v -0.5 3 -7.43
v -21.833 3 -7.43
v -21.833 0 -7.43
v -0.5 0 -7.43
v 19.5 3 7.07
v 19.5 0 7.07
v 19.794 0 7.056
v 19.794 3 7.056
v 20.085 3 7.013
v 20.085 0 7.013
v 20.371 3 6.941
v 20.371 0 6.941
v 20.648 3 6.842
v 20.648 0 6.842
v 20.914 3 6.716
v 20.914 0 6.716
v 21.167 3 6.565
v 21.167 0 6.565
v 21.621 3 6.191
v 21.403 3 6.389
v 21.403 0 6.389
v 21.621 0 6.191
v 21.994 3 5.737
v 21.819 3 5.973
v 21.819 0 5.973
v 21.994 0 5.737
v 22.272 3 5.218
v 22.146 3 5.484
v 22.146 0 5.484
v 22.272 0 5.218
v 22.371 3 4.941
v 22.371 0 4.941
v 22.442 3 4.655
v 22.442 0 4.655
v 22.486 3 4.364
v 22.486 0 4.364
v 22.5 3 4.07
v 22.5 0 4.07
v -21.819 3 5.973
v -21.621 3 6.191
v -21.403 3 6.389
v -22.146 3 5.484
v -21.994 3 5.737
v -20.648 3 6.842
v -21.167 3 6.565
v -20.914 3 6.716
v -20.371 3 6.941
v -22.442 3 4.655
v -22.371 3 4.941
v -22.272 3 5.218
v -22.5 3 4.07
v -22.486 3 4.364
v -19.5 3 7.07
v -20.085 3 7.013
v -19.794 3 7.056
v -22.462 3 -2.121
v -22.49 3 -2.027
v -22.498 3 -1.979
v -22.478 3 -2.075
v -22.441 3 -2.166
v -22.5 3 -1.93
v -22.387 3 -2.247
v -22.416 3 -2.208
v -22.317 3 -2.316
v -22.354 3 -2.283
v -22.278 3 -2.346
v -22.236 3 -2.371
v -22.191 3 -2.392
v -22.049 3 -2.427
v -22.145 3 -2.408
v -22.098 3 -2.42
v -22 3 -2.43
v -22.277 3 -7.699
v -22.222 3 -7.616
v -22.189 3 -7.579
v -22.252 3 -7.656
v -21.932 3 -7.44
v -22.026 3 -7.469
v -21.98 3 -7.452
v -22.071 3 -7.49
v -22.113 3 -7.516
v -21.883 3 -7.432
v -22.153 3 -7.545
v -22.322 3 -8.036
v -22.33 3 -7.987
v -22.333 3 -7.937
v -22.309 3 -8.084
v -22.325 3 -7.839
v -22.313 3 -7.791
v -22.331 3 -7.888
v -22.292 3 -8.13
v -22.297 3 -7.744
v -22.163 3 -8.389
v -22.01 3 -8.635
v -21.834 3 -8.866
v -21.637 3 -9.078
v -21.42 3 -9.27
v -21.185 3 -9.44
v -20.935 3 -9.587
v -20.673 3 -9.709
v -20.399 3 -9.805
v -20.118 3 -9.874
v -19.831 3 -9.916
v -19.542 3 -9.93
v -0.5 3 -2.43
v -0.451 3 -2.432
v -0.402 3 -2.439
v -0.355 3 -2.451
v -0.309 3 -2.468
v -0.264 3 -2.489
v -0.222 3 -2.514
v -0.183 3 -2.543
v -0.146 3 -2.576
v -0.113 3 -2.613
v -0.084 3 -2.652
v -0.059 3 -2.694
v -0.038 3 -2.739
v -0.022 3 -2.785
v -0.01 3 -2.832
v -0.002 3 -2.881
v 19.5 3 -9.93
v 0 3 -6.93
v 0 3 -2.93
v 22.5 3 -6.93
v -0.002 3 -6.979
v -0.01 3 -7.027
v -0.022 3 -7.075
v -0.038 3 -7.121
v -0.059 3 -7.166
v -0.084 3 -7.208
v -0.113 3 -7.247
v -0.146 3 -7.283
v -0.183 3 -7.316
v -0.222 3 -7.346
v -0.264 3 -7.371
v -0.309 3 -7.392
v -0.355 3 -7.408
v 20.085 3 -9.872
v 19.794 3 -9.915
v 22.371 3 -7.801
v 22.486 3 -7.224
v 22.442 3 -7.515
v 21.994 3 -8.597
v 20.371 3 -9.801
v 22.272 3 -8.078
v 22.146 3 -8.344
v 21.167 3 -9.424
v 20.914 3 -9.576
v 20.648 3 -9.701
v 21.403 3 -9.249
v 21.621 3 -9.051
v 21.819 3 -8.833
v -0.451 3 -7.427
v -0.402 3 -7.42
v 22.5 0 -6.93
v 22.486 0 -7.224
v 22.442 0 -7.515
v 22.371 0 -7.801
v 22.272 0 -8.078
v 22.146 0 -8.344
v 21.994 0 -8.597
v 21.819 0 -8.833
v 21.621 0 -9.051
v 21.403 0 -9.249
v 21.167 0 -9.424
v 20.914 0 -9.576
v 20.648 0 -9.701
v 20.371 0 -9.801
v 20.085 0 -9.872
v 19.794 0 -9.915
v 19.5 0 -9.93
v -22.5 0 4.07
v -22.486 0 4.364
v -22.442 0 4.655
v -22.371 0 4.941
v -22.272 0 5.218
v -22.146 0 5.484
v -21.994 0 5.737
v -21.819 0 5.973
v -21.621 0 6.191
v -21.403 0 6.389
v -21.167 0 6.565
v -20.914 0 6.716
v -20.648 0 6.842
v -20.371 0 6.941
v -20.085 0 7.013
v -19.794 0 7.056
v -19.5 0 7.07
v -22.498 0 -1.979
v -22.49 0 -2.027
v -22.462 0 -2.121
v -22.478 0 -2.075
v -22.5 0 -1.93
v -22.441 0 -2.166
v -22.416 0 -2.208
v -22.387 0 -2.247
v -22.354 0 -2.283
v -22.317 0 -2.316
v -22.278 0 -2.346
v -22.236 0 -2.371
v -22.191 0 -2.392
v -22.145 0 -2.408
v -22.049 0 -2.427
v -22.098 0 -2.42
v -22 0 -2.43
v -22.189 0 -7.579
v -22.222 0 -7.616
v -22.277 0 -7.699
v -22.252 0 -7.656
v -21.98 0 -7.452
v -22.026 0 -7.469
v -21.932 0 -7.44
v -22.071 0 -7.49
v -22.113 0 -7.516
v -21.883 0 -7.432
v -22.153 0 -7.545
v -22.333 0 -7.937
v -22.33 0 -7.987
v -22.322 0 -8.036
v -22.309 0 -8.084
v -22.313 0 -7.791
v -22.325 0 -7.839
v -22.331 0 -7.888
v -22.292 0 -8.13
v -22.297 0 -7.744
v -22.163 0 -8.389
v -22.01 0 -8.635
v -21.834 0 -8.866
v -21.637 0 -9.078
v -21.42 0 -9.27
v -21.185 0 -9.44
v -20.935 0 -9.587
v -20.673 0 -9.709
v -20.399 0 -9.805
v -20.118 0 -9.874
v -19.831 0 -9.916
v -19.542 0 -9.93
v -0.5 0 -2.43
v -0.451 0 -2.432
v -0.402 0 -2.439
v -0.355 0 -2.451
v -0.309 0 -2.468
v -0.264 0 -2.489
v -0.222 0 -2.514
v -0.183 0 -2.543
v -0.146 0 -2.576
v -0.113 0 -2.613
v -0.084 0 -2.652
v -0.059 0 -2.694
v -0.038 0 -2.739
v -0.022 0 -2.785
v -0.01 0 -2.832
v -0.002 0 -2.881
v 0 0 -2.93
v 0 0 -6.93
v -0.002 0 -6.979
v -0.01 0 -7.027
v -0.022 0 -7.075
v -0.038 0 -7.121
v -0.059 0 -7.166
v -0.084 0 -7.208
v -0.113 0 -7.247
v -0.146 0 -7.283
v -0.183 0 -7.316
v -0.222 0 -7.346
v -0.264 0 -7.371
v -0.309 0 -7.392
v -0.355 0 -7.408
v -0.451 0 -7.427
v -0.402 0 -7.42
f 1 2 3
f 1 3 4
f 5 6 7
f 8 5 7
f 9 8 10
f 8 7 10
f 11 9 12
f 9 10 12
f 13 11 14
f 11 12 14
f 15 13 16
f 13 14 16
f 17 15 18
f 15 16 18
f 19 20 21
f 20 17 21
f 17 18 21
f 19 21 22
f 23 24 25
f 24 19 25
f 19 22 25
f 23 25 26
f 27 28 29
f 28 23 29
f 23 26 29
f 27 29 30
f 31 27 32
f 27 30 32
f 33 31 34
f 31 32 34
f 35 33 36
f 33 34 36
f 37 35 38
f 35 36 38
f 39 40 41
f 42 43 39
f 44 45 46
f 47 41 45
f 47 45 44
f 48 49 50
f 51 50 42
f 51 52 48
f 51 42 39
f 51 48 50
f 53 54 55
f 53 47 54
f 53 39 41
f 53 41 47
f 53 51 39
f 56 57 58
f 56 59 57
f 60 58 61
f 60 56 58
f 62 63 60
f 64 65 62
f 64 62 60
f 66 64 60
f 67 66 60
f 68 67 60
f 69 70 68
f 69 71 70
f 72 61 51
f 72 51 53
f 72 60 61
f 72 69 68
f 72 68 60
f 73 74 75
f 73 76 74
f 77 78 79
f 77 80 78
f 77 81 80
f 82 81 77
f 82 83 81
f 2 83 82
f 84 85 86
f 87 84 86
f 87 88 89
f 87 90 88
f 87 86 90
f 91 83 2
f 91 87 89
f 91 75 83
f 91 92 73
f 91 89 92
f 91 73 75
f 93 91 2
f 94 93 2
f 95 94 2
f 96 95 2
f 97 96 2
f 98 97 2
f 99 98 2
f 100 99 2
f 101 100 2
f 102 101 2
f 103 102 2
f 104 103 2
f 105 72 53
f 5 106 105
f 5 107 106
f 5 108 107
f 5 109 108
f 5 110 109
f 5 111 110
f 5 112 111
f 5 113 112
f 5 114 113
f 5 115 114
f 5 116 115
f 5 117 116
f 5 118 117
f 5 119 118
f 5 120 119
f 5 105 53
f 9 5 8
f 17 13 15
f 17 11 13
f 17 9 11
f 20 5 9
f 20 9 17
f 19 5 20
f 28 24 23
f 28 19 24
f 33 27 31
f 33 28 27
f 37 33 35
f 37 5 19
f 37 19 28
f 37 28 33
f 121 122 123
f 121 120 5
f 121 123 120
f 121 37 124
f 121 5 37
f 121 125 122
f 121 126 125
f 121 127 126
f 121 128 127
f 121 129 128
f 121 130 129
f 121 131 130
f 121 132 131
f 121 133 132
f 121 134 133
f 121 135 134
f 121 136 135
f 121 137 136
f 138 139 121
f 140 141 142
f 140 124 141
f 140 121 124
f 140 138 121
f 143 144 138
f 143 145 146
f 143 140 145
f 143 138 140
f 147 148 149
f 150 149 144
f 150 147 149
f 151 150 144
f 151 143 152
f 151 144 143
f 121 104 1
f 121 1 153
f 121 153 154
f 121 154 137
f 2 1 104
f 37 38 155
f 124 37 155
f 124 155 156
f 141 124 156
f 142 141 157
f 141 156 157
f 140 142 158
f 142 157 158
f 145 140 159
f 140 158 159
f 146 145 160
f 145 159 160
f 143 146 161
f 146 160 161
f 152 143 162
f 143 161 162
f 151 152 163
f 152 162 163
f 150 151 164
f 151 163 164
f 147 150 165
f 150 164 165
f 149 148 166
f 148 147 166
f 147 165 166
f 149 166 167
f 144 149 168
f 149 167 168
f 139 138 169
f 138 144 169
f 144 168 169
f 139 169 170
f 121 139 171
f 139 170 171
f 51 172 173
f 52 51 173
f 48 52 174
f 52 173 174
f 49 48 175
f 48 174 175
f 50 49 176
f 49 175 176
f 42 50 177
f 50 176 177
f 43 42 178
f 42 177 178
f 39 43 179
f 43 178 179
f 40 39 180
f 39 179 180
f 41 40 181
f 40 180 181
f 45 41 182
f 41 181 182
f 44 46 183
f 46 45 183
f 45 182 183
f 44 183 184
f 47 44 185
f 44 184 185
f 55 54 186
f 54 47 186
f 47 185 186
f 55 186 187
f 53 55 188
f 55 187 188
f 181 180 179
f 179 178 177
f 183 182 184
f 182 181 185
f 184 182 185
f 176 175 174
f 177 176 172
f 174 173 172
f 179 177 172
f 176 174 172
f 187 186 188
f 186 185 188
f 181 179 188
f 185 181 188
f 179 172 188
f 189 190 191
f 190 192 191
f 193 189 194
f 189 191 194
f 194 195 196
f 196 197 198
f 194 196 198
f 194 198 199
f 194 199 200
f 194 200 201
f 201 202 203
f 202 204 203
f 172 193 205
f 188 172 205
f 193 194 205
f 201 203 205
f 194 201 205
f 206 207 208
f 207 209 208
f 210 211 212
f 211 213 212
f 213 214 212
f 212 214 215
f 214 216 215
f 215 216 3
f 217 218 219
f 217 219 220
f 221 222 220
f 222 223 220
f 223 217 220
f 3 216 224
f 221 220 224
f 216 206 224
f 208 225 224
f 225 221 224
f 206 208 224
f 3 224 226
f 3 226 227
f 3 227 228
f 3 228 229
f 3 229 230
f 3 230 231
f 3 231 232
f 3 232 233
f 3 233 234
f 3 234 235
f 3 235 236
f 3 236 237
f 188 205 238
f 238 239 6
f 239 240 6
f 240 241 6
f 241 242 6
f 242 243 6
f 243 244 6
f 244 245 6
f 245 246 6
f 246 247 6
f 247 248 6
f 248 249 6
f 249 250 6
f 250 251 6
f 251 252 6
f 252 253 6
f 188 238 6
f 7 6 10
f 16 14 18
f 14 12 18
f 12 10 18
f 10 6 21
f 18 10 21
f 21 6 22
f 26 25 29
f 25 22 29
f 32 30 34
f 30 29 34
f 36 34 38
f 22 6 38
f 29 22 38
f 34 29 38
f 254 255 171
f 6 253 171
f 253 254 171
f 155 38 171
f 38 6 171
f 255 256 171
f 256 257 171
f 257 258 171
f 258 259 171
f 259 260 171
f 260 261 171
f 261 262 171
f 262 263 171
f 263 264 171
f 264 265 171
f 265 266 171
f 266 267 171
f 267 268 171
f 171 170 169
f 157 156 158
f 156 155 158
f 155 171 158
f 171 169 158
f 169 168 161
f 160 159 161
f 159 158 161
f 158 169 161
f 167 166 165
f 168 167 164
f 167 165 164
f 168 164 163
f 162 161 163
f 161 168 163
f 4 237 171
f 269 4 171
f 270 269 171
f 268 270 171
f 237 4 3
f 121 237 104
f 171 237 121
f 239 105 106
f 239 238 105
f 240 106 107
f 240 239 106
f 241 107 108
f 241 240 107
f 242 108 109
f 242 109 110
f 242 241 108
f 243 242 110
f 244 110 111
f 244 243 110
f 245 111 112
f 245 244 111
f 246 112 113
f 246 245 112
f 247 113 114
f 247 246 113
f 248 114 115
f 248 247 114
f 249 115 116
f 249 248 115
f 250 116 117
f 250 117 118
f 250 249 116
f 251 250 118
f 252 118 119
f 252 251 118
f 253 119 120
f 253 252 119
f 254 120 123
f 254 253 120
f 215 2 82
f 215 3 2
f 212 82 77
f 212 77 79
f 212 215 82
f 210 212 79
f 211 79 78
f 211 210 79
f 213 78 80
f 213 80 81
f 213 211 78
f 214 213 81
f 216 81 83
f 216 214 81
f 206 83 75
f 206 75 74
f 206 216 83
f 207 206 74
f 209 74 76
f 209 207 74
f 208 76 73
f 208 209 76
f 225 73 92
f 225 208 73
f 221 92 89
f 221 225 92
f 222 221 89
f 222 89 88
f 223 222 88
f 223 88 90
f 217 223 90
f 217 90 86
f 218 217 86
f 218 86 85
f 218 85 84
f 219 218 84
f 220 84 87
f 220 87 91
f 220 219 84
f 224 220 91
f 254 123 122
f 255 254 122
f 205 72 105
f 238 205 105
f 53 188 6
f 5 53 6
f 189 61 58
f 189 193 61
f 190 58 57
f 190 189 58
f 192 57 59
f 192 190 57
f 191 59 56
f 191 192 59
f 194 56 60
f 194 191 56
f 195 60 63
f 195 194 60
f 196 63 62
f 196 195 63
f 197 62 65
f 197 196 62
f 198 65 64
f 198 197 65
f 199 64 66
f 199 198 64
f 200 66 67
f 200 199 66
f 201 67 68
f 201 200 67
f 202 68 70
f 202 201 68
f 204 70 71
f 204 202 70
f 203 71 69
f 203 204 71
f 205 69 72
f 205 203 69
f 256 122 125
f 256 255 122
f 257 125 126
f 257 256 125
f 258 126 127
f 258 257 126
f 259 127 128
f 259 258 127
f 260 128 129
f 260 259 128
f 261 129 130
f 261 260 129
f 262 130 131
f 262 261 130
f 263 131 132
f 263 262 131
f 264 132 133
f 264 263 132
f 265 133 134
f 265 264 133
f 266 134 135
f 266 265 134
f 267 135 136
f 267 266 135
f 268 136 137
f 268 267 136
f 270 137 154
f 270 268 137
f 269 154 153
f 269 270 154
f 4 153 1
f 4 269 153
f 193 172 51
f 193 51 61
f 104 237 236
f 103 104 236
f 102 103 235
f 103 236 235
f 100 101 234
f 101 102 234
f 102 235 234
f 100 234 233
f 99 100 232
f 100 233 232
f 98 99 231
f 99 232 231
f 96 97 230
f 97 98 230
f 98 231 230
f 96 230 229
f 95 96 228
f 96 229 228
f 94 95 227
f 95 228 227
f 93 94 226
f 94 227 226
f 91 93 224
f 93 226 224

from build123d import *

# Parameters (mm, degrees)
CROQUIS1_W              = 45
CROQUIS1_H              = 17
SALIENTE_EXTRUIR1_DEPTH = 3
CROQUIS2_W              = 22.5
CROQUIS2_H              = 5
CORTAR_EXTRUIR1_DEPTH   = 3
REDONDEO1_R             = 3
REDONDEO4_R             = 0.5


with BuildPart() as part:
    # Croquis1 → Saliente-Extruir1 (new body)
    with BuildSketch(Plane(origin=(0, 0, 0), x_dir=(1, 0, 0), z_dir=(0, 1, 0))):
        with Locations((0, 1.429847209)):
            Rectangle(CROQUIS1_W, CROQUIS1_H)
    extrude(amount=SALIENTE_EXTRUIR1_DEPTH)

    # Croquis2 → Cortar-Extruir1 (cut)
    with BuildSketch(Plane(origin=(0, 3, 0), x_dir=(1, 0, 0), z_dir=(0, 1, 0))):
        with Locations((-11.25, 4.929847209)):
            Rectangle(CROQUIS2_W, CROQUIS2_H)
    extrude(amount=-CORTAR_EXTRUIR1_DEPTH, mode=Mode.SUBTRACT)

    # Redondeo1
    # the kernel refuses this fillet: 3 mm, written as the material it takes off along each edge
    with BuildSketch(Plane(origin=(-22.5, -7.395099729, -9.929847209), x_dir=(1, 0, 0), z_dir=(0, 1, 0))) as redondeo1_piece_1:
        with BuildLine():
            CenterArc((2.958039892, -3), REDONDEO1_R, 90, 80.405931773)
            Line((0, -2.5), (-0.059160798, -2.49))
            ThreePointArc((-0.059160798, -2.49), (-0.06, -1.25), (-0.06, 0))
            Line((-0.06, 0), (0, 0.06))
            Line((0, 0.06), (2.958039892, 0.06))
            Line((2.958039892, 0.06), (2.958039892, 0))
        make_face()
    extrude(amount=17.790199458, mode=Mode.SUBTRACT)
    with BuildSketch(Plane(origin=(22.5, -7.5, -9.929847209), x_dir=(-1, 0, 0), z_dir=(0, 1, 0)), Plane(origin=(22.5, -7.5, 7.070152791), x_dir=(0, 0, -1), z_dir=(0, 1, 0)), Plane(origin=(-22.5, -7.5, 7.070152791), x_dir=(1, 0, 0), z_dir=(0, 1, 0))) as redondeo1_piece_2:
        with BuildLine():
            CenterArc((REDONDEO1_R, REDONDEO1_R), REDONDEO1_R, 180, 90)
            Line((0, REDONDEO1_R), (-REDONDEO1_R * 0.02, REDONDEO1_R))
            Line((-REDONDEO1_R * 0.02, REDONDEO1_R), (-REDONDEO1_R * 0.02, -REDONDEO1_R * 0.02))
            Line((-REDONDEO1_R * 0.02, -REDONDEO1_R * 0.02), (REDONDEO1_R, -REDONDEO1_R * 0.02))
            Line((REDONDEO1_R, -REDONDEO1_R * 0.02), (REDONDEO1_R, 0))
        make_face()
    extrude(amount=18, mode=Mode.SUBTRACT)

    # Redondeo4
    redondeo4_edges = [part.edges().sort_by_distance(p)[0] for p in [
        (-22.5, 1.5, -2.429847209),
        (-22.5, 1.5, -7.429847209),
        (0, 1.5, -7.429847209),
        (0, 1.5, -2.429847209),
    ]]
    fillet(redondeo4_edges, radius=REDONDEO4_R)


solid = part.part
